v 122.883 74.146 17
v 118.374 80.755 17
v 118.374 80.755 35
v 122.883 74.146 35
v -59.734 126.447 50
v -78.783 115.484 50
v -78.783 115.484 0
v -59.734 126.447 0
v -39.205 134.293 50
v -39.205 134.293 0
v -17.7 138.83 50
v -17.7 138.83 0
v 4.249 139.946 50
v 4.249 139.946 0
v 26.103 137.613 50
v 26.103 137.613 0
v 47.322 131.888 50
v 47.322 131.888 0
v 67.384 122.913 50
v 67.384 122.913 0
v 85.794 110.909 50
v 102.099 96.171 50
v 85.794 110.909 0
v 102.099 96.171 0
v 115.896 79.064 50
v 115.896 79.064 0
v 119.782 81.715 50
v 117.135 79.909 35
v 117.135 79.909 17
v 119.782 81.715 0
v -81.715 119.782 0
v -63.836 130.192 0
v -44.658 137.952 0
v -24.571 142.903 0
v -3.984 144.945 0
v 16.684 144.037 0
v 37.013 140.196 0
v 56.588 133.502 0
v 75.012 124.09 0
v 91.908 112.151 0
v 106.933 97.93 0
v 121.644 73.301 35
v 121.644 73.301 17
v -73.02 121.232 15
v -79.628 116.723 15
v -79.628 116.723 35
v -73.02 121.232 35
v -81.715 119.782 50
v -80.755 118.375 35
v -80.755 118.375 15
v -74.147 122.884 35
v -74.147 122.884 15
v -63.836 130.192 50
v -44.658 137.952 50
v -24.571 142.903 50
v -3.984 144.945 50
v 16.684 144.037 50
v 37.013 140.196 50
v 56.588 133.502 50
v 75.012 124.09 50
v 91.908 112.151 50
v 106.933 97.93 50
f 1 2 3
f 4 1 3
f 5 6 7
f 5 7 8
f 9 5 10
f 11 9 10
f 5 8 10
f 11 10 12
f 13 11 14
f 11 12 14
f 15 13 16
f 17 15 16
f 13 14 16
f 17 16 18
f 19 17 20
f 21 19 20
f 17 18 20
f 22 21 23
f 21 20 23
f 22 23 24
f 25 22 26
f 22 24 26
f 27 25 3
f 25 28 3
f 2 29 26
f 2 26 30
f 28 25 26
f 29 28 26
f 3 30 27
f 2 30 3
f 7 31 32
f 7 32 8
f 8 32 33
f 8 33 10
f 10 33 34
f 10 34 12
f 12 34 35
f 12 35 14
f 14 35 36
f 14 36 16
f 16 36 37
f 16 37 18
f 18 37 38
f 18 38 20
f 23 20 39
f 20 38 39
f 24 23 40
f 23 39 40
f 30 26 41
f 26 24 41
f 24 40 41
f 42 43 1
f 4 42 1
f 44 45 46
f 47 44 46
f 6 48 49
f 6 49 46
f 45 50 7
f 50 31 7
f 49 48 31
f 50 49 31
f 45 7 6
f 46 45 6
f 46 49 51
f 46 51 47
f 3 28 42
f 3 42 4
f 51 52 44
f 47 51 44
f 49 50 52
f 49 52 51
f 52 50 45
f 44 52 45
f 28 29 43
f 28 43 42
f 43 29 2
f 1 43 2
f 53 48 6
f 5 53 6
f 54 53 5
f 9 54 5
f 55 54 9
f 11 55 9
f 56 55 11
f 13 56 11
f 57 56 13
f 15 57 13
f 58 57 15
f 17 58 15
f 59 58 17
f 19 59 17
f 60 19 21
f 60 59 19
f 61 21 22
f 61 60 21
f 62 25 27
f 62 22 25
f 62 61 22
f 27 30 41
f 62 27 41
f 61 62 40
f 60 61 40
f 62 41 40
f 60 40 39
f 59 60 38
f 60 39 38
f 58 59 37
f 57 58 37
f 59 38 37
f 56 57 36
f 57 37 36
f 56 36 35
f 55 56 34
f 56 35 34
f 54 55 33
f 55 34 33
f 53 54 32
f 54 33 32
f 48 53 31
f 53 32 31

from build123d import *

# Parameters (mm, degrees)
F1_DEPTH = 50
F3_W     = 1.5
F3_H     = 18
F4_DEPTH = 8
F6_W     = 2
F6_H     = 20
F7_DEPTH = 8


with BuildPart() as f1:
    # F0 (on Top) → F1 (new body)
    with BuildSketch(Plane.XY):
        with BuildLine():
            Line((115.8960640123, 79.0640294468), (119.7818013352, 81.7148705494))
            ThreePointArc((119.7818013352, 81.7148705494), (26.9173848976, 142.4796630761), (-81.7148705494, 119.7818013352))
            Line((-81.7148705494, 119.7818013352), (-78.783015845, 115.4841400235))
            ThreePointArc((-78.783015845, 115.4841400235), (26.1029639495, 137.6126214945), (115.8960640123, 79.0640294468))
        make_face()
    extrude(amount=F1_DEPTH)

    # F3 (on offset) → F4 (join)
    with BuildSketch(Plane(origin=(0, 0, 0), x_dir=(0.8260813885, 0.5635508314, 0), z_dir=(0.5635508314, -0.8260813885, 0))):
        with Locations((142.5461810097, 26)):
            Rectangle(F3_W, F3_H)
    extrude(amount=F4_DEPTH)

    # F6 (on offset) → F7 (cut)
    with BuildSketch(Plane(origin=(0, 0, 0), x_dir=(0.5635508314, -0.8260813885, 0), z_dir=(-0.8260813885, -0.5635508314, 0))):
        with Locations((-142.2975328202, 25)):
            Rectangle(F6_W, F6_H)
    extrude(amount=-F7_DEPTH, mode=Mode.SUBTRACT)


solid = f1.part
